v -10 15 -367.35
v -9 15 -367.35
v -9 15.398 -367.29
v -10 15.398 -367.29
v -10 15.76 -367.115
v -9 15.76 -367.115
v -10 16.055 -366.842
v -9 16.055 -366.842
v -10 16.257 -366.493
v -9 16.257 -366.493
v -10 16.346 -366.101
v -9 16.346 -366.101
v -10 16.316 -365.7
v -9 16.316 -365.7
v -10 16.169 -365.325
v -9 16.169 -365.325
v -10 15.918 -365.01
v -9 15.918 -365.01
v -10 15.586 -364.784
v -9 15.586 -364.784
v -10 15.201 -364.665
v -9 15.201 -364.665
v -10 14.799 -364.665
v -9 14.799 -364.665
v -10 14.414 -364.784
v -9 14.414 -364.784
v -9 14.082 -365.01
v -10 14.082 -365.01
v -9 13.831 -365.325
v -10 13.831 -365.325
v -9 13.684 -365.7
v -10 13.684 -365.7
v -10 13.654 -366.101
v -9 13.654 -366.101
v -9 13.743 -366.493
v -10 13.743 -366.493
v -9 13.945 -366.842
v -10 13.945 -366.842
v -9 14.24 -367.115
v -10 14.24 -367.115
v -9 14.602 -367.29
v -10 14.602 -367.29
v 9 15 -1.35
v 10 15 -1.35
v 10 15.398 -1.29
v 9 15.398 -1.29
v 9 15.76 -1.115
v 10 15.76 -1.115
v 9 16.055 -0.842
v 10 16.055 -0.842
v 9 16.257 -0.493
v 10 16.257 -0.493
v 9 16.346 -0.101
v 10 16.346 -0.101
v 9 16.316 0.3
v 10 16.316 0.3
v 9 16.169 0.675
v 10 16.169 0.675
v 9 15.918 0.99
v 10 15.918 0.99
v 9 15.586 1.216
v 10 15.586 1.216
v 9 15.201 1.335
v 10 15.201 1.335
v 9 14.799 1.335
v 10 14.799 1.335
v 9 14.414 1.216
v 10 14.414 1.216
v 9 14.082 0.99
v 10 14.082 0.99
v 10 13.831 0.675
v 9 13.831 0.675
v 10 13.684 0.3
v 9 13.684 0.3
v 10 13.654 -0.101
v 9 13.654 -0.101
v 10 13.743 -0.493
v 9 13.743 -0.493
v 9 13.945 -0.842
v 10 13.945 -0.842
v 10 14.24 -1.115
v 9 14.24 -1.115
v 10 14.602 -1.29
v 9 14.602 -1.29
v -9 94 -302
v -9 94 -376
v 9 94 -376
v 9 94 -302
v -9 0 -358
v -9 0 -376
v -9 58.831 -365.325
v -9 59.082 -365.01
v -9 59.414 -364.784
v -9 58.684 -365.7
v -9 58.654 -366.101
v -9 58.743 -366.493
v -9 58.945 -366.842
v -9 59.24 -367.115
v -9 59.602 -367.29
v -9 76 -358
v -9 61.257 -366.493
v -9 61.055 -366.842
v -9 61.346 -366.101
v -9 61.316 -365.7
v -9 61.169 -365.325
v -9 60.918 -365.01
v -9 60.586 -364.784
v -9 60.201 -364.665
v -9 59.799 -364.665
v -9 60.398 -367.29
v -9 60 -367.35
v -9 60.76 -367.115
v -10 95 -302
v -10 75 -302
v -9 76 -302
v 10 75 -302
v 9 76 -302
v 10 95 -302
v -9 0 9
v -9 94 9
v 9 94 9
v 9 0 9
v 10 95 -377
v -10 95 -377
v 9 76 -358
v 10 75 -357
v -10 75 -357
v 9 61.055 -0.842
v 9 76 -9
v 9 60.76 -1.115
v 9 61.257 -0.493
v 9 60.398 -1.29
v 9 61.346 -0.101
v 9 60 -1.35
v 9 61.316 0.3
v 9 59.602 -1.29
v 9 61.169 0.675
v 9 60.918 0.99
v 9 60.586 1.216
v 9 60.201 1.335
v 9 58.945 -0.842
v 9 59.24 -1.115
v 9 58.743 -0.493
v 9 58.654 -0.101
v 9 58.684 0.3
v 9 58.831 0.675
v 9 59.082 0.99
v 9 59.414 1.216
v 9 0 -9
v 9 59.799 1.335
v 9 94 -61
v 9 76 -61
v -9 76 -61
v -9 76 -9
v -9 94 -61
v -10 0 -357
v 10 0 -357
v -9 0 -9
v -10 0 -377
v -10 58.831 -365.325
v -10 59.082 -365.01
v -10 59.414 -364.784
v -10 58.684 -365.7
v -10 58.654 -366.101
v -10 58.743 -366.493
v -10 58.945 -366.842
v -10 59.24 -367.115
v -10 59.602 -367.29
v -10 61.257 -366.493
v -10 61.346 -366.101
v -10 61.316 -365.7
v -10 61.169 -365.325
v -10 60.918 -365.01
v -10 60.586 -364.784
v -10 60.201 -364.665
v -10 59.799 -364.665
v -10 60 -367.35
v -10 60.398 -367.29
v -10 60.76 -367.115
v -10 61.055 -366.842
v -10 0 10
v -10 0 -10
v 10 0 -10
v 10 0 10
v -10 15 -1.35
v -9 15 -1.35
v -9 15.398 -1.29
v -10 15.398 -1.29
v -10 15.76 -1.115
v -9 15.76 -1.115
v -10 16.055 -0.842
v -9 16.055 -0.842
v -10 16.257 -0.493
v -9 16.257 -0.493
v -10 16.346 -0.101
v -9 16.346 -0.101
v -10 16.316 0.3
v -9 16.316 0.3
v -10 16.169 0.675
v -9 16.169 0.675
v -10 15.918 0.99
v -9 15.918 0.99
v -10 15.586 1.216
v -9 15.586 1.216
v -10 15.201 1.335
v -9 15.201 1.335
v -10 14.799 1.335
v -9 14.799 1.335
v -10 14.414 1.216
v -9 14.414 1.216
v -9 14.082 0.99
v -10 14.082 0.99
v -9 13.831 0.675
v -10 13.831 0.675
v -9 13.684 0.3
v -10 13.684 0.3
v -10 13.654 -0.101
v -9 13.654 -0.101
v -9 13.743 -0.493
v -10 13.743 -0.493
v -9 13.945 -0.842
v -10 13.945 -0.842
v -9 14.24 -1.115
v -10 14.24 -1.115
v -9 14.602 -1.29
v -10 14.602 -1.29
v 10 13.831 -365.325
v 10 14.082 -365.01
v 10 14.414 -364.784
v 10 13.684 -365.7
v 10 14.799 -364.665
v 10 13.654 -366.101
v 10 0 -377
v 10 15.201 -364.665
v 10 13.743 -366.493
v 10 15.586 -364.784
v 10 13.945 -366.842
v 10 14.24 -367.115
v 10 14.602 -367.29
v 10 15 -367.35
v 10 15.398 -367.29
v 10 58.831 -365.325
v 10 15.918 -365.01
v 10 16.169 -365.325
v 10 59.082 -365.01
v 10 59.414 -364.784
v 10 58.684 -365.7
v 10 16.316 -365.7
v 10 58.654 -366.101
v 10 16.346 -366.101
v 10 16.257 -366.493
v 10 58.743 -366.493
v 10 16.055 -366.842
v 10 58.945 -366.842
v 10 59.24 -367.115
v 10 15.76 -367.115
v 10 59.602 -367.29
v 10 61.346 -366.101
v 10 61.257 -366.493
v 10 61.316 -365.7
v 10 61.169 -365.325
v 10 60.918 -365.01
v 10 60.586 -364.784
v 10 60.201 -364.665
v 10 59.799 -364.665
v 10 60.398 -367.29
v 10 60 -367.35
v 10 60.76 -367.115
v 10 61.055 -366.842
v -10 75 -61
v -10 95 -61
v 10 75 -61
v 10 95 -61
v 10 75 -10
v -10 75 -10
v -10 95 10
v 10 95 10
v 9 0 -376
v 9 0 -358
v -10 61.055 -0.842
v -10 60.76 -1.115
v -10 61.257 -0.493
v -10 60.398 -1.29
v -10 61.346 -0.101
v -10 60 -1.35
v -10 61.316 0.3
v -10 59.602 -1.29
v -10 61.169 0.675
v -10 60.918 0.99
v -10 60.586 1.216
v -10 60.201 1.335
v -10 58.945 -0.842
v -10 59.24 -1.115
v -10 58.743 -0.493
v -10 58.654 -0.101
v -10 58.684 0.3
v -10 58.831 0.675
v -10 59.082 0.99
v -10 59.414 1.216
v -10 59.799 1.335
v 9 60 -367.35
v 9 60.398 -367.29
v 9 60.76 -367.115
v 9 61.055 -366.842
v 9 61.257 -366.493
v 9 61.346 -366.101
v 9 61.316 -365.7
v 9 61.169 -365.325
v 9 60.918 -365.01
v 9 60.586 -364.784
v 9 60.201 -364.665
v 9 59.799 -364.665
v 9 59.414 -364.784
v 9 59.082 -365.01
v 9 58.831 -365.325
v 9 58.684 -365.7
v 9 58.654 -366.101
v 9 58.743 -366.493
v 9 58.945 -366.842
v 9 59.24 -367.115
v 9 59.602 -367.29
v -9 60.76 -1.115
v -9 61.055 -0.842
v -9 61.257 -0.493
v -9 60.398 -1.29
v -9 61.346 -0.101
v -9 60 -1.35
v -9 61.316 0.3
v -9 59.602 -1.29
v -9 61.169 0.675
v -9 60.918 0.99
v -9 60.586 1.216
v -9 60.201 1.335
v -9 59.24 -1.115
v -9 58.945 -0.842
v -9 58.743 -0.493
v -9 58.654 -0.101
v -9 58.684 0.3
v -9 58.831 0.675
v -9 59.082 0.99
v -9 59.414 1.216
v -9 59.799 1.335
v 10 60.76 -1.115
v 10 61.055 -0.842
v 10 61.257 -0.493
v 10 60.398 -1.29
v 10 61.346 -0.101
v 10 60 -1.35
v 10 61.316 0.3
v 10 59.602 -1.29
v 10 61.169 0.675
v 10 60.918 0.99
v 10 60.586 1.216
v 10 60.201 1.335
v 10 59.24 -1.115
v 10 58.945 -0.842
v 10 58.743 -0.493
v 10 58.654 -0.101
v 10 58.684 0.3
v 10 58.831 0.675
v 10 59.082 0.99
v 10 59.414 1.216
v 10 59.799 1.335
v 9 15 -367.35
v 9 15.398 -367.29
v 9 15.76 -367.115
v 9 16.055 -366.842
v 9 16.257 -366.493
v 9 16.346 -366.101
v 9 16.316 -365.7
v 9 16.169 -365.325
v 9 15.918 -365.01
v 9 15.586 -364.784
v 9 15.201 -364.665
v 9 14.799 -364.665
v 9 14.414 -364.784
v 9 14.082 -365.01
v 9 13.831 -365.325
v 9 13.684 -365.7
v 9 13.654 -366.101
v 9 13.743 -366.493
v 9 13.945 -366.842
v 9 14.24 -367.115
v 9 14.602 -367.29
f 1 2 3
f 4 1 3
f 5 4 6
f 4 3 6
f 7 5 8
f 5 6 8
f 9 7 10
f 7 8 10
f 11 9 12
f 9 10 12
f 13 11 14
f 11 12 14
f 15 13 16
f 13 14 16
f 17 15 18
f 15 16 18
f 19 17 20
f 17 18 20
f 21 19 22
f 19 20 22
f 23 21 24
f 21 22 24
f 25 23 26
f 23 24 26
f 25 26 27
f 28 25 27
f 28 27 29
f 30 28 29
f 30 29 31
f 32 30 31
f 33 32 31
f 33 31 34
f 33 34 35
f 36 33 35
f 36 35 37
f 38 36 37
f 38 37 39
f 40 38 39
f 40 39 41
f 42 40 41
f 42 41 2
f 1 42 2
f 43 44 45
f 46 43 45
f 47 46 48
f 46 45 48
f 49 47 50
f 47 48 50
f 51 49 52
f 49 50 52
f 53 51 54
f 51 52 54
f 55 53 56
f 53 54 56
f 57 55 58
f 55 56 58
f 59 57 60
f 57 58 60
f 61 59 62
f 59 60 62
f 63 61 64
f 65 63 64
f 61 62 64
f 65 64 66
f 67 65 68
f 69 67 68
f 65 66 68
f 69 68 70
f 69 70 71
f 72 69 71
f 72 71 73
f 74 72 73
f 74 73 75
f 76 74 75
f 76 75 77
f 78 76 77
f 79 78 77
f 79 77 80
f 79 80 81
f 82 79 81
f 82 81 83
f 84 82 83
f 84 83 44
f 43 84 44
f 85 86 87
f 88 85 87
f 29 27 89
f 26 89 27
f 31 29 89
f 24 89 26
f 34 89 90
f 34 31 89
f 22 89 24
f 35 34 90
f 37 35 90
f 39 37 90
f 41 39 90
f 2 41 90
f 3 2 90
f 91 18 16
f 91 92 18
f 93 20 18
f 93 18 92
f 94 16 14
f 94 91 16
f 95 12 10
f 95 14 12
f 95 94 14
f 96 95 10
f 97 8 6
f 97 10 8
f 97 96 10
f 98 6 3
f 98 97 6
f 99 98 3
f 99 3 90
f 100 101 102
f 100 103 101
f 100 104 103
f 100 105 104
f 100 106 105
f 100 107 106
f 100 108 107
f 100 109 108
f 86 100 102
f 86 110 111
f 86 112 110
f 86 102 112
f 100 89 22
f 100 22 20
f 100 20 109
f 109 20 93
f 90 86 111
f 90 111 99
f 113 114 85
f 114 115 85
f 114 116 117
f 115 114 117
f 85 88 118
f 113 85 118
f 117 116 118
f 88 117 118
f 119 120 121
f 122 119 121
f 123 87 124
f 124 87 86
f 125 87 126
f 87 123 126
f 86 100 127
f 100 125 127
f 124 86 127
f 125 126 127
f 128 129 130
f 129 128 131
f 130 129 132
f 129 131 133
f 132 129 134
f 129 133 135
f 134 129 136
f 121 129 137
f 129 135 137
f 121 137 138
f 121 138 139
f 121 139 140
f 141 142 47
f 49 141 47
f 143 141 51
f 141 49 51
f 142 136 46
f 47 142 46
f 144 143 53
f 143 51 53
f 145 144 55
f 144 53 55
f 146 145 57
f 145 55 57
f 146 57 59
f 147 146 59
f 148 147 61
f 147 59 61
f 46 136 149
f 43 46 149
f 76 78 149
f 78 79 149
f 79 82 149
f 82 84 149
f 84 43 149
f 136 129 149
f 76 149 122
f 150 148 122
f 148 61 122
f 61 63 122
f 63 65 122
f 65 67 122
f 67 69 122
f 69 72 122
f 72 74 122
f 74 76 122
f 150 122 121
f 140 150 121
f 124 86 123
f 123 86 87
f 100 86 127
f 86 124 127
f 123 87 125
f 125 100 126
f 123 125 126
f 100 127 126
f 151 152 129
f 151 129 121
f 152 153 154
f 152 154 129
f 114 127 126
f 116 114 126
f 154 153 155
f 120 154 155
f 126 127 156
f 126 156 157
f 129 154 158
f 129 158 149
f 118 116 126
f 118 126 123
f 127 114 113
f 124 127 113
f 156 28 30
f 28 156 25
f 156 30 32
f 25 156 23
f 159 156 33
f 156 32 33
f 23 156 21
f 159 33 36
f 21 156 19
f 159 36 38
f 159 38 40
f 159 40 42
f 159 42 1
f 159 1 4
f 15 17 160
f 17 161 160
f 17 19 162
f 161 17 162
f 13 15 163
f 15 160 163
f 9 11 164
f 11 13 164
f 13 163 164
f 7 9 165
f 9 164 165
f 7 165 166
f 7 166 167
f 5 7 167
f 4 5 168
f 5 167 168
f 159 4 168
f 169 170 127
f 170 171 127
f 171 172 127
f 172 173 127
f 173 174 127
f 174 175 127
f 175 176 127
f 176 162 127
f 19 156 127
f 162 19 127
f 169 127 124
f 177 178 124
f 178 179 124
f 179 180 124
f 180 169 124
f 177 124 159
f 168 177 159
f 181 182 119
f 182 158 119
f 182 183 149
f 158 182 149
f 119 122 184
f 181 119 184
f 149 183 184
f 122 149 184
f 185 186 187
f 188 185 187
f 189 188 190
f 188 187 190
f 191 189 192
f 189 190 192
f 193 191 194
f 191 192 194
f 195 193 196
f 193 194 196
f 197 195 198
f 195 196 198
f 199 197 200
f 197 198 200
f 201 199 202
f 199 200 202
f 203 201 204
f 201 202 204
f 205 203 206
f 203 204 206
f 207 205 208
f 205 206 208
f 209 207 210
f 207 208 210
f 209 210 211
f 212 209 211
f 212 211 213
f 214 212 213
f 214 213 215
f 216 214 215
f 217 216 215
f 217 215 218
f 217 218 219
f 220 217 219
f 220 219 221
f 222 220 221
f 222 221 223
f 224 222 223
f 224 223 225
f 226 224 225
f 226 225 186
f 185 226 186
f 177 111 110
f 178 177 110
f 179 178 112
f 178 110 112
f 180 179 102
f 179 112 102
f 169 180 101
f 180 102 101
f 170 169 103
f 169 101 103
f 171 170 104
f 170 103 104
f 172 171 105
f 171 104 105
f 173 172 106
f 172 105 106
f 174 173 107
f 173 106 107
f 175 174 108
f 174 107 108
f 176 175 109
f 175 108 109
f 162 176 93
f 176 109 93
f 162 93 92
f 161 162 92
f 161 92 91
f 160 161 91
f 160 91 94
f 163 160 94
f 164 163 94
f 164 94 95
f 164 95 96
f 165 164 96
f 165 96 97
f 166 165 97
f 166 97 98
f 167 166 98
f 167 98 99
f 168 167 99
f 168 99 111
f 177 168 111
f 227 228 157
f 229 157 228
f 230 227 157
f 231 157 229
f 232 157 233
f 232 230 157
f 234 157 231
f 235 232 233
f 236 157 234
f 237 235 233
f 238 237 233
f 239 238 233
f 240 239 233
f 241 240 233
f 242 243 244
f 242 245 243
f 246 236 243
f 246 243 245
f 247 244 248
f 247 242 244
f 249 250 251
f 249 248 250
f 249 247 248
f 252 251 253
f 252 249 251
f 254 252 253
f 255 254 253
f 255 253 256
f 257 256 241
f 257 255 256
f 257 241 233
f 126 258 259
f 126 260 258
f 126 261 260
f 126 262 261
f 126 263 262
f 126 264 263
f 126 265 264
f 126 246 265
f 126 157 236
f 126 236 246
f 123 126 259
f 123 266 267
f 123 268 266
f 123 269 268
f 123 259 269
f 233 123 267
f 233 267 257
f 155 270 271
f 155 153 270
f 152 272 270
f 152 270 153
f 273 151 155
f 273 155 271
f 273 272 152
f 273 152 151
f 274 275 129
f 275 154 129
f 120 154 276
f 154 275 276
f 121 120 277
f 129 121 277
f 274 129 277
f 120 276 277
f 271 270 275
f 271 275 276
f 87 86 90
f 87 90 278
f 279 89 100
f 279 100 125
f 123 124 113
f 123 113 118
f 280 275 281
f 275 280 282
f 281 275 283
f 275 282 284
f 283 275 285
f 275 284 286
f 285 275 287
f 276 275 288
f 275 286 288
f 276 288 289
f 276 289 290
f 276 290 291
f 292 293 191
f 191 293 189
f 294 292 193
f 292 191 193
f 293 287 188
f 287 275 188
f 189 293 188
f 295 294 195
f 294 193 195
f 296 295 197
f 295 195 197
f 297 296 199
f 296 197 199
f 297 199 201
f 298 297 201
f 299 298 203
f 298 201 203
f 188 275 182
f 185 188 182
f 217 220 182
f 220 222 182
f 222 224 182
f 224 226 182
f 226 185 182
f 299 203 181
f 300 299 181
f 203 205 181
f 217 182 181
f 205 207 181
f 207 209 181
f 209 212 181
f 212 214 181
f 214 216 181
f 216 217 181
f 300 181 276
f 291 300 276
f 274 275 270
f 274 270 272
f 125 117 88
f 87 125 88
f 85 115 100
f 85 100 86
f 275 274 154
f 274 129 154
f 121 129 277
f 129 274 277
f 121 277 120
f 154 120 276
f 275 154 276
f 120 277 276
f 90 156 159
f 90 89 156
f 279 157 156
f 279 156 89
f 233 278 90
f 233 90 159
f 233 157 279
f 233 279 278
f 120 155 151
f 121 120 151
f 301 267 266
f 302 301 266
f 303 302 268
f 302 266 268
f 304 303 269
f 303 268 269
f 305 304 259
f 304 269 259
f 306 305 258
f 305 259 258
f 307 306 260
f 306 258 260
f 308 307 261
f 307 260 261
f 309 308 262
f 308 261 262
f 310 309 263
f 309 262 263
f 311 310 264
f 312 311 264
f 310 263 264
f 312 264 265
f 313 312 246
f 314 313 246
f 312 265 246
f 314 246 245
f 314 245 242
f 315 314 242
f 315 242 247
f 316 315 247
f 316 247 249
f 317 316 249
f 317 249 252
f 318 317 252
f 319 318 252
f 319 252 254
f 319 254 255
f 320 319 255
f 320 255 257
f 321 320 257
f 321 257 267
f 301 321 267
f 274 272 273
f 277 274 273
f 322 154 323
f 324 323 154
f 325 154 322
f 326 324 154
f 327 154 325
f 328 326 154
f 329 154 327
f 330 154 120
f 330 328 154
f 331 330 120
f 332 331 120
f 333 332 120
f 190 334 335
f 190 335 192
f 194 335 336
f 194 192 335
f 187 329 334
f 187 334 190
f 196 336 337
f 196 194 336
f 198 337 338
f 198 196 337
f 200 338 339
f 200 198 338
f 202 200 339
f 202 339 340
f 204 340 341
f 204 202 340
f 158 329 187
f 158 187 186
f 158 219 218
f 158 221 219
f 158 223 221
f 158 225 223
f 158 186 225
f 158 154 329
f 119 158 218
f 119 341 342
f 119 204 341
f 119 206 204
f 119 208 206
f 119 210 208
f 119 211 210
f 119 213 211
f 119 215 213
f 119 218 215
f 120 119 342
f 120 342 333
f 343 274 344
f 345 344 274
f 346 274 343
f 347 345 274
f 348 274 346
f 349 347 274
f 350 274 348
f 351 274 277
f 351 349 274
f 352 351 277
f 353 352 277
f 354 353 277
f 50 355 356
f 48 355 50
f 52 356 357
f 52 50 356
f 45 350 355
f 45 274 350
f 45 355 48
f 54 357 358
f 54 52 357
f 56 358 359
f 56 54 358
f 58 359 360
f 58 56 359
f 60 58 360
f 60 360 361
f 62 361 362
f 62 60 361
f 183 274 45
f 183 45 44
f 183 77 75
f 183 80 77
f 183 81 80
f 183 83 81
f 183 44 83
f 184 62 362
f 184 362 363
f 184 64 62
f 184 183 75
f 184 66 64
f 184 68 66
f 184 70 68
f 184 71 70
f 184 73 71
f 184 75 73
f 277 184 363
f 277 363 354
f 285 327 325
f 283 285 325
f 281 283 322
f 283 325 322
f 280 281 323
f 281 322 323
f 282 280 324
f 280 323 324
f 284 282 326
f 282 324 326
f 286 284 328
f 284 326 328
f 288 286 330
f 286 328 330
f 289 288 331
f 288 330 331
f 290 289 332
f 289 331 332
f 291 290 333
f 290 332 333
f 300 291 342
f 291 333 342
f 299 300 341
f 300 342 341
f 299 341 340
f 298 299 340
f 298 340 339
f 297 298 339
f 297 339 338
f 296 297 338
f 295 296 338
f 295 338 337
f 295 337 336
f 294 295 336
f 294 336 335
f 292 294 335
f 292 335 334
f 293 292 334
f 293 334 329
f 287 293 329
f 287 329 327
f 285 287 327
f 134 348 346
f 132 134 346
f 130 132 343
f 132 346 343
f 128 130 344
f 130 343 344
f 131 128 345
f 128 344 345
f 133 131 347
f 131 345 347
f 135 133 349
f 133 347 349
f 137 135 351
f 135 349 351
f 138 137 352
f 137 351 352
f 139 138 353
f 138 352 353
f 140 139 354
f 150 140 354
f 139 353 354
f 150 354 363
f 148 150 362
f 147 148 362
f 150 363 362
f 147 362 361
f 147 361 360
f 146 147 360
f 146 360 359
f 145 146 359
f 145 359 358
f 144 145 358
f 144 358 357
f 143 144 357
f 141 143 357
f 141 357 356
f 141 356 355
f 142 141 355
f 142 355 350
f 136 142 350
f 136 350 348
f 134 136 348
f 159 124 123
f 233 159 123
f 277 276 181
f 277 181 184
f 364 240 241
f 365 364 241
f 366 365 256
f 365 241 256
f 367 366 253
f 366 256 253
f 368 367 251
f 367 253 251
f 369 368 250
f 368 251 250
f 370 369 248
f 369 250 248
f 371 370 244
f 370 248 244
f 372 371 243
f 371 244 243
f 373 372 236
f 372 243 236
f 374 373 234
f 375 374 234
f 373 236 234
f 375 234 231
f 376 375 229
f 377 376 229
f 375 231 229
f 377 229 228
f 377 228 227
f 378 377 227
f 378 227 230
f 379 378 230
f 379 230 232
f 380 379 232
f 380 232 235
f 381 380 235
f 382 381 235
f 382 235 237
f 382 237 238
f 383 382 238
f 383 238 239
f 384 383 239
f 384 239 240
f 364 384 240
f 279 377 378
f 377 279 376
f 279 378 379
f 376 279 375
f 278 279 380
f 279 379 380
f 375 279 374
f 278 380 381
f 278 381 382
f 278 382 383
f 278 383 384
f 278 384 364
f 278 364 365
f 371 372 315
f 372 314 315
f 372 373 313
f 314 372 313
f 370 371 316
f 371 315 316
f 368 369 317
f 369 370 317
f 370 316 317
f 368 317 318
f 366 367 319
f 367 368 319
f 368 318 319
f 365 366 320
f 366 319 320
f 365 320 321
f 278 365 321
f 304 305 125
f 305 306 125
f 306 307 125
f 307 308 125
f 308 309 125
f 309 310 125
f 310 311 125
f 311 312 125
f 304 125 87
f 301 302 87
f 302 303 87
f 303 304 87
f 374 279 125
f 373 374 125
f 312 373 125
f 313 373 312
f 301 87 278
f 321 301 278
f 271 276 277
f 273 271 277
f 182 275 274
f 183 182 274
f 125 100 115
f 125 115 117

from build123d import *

# Parameters (mm, degrees)
SKETCH_11_W                = 20
SKETCH_11_H                = 20
SKETCH_11_W_2              = 18
SKETCH_11_H_2              = 18
F_20X20X1_1_DEPTH          = 100.142135624
SKETCH_11_ON_SEGMENT_2_W   = 20
SKETCH_11_ON_SEGMENT_2_H   = 20
SKETCH_11_ON_SEGMENT_2_W_2 = 18
SKETCH_11_ON_SEGMENT_2_H_2 = 18
F_20X20X1_1_2_DEPTH        = 397.284271247
SKETCH_11_ON_SEGMENT_3_W   = 20
SKETCH_11_ON_SEGMENT_3_H   = 20
SKETCH_11_ON_SEGMENT_3_W_2 = 18
SKETCH_11_ON_SEGMENT_3_H_2 = 18
F_20X20X1_1_3_DEPTH        = 100.142135624
CUT_EXTRUDE_1_REACH        = 391.299
SKETCH_12_R                = 1.5
SKETCH_14_W                = 241
SKETCH_14_H                = 20
CUT_EXTRUDE_3_DEPTH        = 390.299370665
SKETCH_15_R                = 1.35
CUT_EXTRUDE_4_DEPTH        = 20


with BuildPart() as part:
    # 草图11 → 铝管 20X20X1(1) (new body)
    with BuildSketch(Plane.ZX):
        Rectangle(SKETCH_11_W, SKETCH_11_H)
        Rectangle(SKETCH_11_W_2, SKETCH_11_H_2, mode=Mode.SUBTRACT)
    extrude(amount=F_20X20X1_1_DEPTH)

    # 铝管 20X20X1(1) mitre 1
    split(bisect_by=Plane(origin=(0, 85, 0), x_dir=(1, 0, 0), z_dir=(0, -0.707106781, 0.707106781)), keep=Keep.TOP)


with BuildPart() as body_2:
    # 草图11 on segment 2 (carried to segment 2) → 20X20X1_1 2 (new body)
    with BuildSketch(Plane(origin=(0, 85, 15.142135624), x_dir=(0, 1, 0), z_dir=(0, 0, -1))):
        Rectangle(SKETCH_11_ON_SEGMENT_2_W, SKETCH_11_ON_SEGMENT_2_H)
        Rectangle(SKETCH_11_ON_SEGMENT_2_W_2, SKETCH_11_ON_SEGMENT_2_H_2, mode=Mode.SUBTRACT)
    extrude(amount=F_20X20X1_1_2_DEPTH)

    # 20X20X1_1 2 mitre 1
    split(bisect_by=Plane(origin=(0, 85, 0), x_dir=(-1, 0, 0), z_dir=(0, 0.707106781, -0.707106781)), keep=Keep.TOP)

    # 20X20X1_1 2 mitre 2
    split(bisect_by=Plane(origin=(0, 85, -367), x_dir=(-1, 0, 0), z_dir=(0, 0.707106781, 0.707106781)), keep=Keep.TOP)

    # 切除-拉伸1: up to this face of the body (flat: up to its plane)
    cut_extrude_1_end = Plane(body_2.part.faces().sort_by_distance((-10, 85.181653043, -183.5))[0])
    # 草图12 → 切除-拉伸1 (cut, up to the picked face)
    with BuildSketch(Plane(origin=(10, 0, 0), x_dir=(0, 0, -1), z_dir=(1, 0, 0)), mode=Mode.PRIVATE) as cut_extrude_1_sk1:
        with Locations((133.5, 81)):
            Circle(SKETCH_12_R)
    cut_extrude_1_tool1 = split(extrude(cut_extrude_1_sk1.sketch, amount=-CUT_EXTRUDE_1_REACH, mode=Mode.PRIVATE), bisect_by=cut_extrude_1_end, keep=Keep.BOTH, mode=Mode.PRIVATE)
    # 草图12 → 切除-拉伸1 (cut, up to the picked face)
    with BuildSketch(Plane(origin=(10, 0, 0), x_dir=(0, 0, -1), z_dir=(1, 0, 0)), mode=Mode.PRIVATE) as cut_extrude_1_sk2:
        with Locations((233.5, 81)):
            Circle(SKETCH_12_R)
    cut_extrude_1_tool2 = split(extrude(cut_extrude_1_sk2.sketch, amount=-CUT_EXTRUDE_1_REACH, mode=Mode.PRIVATE), bisect_by=cut_extrude_1_end, keep=Keep.BOTH, mode=Mode.PRIVATE)
    add(cut_extrude_1_tool1.solids().sort_by(Axis((10, 81, -133.5), (-1, 0, 0)))[0], mode=Mode.SUBTRACT)
    add(cut_extrude_1_tool2.solids().sort_by(Axis((10, 81, -233.5), (-1, 0, 0)))[0], mode=Mode.SUBTRACT)

    # 草图14 → 切除-拉伸3 (cut, through all)
    with BuildSketch(Plane(origin=(10, 0, 0), x_dir=(0, 0, -1), z_dir=(1, 0, 0))):
        with Locations((181.5, 85)):
            Rectangle(SKETCH_14_W, SKETCH_14_H)
    extrude(amount=-CUT_EXTRUDE_3_DEPTH, mode=Mode.SUBTRACT)


with BuildPart() as body_3:
    # 草图11 on segment 3 (carried to segment 3) → 20X20X1_1 3 (new body)
    with BuildSketch(Plane(origin=(0, 100.142135624, -367), x_dir=(0, 0, -1), z_dir=(0, -1, 0))):
        Rectangle(SKETCH_11_ON_SEGMENT_3_W, SKETCH_11_ON_SEGMENT_3_H)
        Rectangle(SKETCH_11_ON_SEGMENT_3_W_2, SKETCH_11_ON_SEGMENT_3_H_2, mode=Mode.SUBTRACT)
    extrude(amount=F_20X20X1_1_3_DEPTH)

    # 20X20X1_1 3 mitre 1
    split(bisect_by=Plane(origin=(0, 85, -367), x_dir=(1, 0, 0), z_dir=(0, -0.707106781, -0.707106781)), keep=Keep.TOP)


with BuildPart() as cut_extrude_3_piece_1:
    # of the separate pieces the step leaves, piece 1, a body of its own (cut_extrude_3_pieces)
    add(body_2.part.solids().sort_by_distance((-10, 75, -302))[0])


with BuildPart() as cut_extrude_3_piece_2:
    # of the separate pieces the step leaves, piece 2, a body of its own (cut_extrude_3_pieces)
    add(body_2.part.solids().sort_by_distance((-10, 75, -10))[0])


with BuildPart() as cut_extrude_4_tool:
    # 草图15 → 切除-拉伸4 (new body)
    with BuildSketch(Plane(origin=(10, 0, 0), x_dir=(0, 0, -1), z_dir=(1, 0, 0))):
        with Locations((366, 60)):
            Circle(SKETCH_15_R)
        with Locations((366, 15)):
            Circle(SKETCH_15_R)
        with Locations((0, 60)):
            Circle(SKETCH_15_R)
        with Locations((0, 15)):
            Circle(SKETCH_15_R)
    extrude(amount=-CUT_EXTRUDE_4_DEPTH)


with BuildPart() as part_1:
    add(part.part)

    # 切除-拉伸4: cut by cut_extrude_4_tool
    add(cut_extrude_4_tool.part, mode=Mode.SUBTRACT)


with BuildPart() as body_3_1:
    add(body_3.part)

    # 切除-拉伸4: cut by cut_extrude_4_tool
    add(cut_extrude_4_tool.part, mode=Mode.SUBTRACT)


solid = Compound([cut_extrude_3_piece_1.part, cut_extrude_3_piece_2.part, part_1.part, body_3_1.part])
